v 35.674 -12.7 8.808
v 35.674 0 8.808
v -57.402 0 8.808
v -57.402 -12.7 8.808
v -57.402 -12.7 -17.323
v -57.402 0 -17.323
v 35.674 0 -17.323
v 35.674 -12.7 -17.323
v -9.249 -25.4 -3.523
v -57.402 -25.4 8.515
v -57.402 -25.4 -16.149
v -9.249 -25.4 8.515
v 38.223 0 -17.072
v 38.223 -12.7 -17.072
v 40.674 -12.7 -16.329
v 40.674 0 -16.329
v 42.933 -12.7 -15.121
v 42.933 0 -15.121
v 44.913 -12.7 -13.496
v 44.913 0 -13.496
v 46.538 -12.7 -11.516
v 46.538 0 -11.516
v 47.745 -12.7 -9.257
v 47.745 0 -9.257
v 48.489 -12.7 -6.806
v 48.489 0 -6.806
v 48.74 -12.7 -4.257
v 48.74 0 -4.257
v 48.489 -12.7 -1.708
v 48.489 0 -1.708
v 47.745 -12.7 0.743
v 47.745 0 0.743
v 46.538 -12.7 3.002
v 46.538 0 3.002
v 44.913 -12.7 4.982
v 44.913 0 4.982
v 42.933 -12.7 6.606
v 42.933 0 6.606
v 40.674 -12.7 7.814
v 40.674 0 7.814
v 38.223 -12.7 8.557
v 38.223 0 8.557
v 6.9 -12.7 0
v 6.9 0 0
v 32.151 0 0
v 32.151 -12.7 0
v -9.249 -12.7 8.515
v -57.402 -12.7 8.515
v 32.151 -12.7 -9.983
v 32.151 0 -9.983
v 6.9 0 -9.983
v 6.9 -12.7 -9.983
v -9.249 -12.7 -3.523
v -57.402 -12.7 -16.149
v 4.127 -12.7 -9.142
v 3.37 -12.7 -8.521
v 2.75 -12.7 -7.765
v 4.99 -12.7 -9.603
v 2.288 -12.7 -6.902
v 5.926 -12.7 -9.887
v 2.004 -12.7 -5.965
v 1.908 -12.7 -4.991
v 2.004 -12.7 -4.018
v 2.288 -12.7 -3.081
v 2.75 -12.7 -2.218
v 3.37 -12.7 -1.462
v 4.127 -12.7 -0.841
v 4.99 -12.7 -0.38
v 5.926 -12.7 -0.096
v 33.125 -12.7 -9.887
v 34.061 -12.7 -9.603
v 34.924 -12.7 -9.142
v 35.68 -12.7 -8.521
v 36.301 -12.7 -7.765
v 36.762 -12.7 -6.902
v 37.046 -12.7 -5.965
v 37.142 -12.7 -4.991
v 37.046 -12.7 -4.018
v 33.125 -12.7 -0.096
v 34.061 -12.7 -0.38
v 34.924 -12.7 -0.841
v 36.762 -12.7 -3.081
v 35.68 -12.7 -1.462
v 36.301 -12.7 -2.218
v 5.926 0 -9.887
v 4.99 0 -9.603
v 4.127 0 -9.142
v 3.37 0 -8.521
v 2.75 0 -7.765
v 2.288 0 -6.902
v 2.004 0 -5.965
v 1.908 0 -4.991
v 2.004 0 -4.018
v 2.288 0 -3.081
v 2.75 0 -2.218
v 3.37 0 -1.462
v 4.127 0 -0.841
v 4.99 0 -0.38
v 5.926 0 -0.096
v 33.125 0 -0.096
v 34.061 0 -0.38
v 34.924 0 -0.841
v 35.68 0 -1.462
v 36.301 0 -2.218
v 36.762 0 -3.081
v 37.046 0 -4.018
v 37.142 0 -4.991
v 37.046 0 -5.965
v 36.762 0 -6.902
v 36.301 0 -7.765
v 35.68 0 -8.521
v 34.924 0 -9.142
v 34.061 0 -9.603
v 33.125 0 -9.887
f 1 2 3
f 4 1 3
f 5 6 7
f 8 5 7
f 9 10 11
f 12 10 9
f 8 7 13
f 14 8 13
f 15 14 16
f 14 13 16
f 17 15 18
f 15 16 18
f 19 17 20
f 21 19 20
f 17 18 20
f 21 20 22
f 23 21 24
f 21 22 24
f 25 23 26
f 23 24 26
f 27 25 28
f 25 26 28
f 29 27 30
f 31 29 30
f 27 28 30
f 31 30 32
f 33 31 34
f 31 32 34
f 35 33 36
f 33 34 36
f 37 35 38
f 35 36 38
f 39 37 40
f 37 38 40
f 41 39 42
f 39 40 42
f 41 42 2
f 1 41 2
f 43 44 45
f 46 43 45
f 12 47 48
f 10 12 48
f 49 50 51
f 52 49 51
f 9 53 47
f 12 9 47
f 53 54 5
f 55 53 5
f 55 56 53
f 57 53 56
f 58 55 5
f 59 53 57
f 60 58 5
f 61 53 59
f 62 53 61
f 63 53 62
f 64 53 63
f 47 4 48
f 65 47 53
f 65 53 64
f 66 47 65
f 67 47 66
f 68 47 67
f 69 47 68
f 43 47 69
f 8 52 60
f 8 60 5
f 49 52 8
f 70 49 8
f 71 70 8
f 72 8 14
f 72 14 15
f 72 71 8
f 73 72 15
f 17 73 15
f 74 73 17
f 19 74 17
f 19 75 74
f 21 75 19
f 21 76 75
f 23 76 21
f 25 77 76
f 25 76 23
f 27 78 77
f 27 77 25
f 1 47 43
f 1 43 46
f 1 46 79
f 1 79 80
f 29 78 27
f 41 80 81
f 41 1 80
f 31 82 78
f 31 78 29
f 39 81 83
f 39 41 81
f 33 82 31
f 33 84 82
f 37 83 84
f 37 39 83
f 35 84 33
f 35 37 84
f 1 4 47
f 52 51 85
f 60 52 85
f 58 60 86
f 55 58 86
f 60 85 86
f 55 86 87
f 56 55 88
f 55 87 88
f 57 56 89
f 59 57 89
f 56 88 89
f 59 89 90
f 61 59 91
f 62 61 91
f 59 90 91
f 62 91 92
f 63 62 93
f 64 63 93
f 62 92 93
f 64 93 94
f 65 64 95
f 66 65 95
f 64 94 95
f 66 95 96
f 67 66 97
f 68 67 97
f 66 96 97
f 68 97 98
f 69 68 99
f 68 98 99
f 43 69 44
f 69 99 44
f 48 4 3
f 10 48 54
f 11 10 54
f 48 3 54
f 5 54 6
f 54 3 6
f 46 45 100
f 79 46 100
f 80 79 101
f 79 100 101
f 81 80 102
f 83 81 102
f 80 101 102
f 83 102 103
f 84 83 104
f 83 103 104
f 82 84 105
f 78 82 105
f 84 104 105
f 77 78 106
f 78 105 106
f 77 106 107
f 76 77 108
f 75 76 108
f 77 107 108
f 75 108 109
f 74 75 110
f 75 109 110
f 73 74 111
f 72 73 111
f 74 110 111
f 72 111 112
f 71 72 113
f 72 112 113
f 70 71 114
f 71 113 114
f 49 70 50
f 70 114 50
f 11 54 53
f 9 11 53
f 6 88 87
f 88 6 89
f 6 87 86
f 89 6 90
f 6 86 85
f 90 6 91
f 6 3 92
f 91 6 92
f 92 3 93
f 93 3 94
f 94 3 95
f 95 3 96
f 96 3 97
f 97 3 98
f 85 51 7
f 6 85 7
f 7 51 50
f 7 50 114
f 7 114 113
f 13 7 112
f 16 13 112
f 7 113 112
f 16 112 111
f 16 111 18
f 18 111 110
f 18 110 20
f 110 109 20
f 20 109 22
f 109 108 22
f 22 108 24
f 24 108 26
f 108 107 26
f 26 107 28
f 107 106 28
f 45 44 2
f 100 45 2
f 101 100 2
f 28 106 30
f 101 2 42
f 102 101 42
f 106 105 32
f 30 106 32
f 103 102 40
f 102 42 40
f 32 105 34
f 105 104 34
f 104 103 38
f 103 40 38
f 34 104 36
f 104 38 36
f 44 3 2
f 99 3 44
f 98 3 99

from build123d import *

# Parameters (mm, degrees)
F1_DEPTH = 25.4
F3_DEPTH = 12.7


with BuildPart() as f1:
    # F0 (on Front) → F1 (new body)
    with BuildSketch(Plane.XZ):
        Polygon((-9.248863, 8.514826), (-57.401668, 8.514826), (-57.401668, -16.148807), (-9.248863, -3.523376), align=None)
    extrude(amount=F1_DEPTH)

    # F2 (on Front) → F3 (join)
    with BuildSketch(Plane.XZ):
        with BuildLine():
            Line((35.674185, 8.808441), (-57.401668, 8.808441))
            Line((-57.401668, 8.808441), (-57.401668, -17.323267))
            Line((-57.401668, -17.323267), (35.674185, -17.323267))
            ThreePointArc((35.674185, -17.323267), (48.740038, -4.257413), (35.674185, 8.808441))
        make_face()
        with BuildLine():
            ThreePointArc((6.899945, -9.982899), (1.908496, -4.991449), (6.899945, 0))
            Line((6.899945, 0), (32.150805, 0))
            ThreePointArc((32.150805, 0), (37.142254, -4.991449), (32.150805, -9.982899))
            Line((32.150805, -9.982899), (6.899945, -9.982899))
        make_face(mode=Mode.SUBTRACT)
    extrude(amount=F3_DEPTH)


solid = f1.part
